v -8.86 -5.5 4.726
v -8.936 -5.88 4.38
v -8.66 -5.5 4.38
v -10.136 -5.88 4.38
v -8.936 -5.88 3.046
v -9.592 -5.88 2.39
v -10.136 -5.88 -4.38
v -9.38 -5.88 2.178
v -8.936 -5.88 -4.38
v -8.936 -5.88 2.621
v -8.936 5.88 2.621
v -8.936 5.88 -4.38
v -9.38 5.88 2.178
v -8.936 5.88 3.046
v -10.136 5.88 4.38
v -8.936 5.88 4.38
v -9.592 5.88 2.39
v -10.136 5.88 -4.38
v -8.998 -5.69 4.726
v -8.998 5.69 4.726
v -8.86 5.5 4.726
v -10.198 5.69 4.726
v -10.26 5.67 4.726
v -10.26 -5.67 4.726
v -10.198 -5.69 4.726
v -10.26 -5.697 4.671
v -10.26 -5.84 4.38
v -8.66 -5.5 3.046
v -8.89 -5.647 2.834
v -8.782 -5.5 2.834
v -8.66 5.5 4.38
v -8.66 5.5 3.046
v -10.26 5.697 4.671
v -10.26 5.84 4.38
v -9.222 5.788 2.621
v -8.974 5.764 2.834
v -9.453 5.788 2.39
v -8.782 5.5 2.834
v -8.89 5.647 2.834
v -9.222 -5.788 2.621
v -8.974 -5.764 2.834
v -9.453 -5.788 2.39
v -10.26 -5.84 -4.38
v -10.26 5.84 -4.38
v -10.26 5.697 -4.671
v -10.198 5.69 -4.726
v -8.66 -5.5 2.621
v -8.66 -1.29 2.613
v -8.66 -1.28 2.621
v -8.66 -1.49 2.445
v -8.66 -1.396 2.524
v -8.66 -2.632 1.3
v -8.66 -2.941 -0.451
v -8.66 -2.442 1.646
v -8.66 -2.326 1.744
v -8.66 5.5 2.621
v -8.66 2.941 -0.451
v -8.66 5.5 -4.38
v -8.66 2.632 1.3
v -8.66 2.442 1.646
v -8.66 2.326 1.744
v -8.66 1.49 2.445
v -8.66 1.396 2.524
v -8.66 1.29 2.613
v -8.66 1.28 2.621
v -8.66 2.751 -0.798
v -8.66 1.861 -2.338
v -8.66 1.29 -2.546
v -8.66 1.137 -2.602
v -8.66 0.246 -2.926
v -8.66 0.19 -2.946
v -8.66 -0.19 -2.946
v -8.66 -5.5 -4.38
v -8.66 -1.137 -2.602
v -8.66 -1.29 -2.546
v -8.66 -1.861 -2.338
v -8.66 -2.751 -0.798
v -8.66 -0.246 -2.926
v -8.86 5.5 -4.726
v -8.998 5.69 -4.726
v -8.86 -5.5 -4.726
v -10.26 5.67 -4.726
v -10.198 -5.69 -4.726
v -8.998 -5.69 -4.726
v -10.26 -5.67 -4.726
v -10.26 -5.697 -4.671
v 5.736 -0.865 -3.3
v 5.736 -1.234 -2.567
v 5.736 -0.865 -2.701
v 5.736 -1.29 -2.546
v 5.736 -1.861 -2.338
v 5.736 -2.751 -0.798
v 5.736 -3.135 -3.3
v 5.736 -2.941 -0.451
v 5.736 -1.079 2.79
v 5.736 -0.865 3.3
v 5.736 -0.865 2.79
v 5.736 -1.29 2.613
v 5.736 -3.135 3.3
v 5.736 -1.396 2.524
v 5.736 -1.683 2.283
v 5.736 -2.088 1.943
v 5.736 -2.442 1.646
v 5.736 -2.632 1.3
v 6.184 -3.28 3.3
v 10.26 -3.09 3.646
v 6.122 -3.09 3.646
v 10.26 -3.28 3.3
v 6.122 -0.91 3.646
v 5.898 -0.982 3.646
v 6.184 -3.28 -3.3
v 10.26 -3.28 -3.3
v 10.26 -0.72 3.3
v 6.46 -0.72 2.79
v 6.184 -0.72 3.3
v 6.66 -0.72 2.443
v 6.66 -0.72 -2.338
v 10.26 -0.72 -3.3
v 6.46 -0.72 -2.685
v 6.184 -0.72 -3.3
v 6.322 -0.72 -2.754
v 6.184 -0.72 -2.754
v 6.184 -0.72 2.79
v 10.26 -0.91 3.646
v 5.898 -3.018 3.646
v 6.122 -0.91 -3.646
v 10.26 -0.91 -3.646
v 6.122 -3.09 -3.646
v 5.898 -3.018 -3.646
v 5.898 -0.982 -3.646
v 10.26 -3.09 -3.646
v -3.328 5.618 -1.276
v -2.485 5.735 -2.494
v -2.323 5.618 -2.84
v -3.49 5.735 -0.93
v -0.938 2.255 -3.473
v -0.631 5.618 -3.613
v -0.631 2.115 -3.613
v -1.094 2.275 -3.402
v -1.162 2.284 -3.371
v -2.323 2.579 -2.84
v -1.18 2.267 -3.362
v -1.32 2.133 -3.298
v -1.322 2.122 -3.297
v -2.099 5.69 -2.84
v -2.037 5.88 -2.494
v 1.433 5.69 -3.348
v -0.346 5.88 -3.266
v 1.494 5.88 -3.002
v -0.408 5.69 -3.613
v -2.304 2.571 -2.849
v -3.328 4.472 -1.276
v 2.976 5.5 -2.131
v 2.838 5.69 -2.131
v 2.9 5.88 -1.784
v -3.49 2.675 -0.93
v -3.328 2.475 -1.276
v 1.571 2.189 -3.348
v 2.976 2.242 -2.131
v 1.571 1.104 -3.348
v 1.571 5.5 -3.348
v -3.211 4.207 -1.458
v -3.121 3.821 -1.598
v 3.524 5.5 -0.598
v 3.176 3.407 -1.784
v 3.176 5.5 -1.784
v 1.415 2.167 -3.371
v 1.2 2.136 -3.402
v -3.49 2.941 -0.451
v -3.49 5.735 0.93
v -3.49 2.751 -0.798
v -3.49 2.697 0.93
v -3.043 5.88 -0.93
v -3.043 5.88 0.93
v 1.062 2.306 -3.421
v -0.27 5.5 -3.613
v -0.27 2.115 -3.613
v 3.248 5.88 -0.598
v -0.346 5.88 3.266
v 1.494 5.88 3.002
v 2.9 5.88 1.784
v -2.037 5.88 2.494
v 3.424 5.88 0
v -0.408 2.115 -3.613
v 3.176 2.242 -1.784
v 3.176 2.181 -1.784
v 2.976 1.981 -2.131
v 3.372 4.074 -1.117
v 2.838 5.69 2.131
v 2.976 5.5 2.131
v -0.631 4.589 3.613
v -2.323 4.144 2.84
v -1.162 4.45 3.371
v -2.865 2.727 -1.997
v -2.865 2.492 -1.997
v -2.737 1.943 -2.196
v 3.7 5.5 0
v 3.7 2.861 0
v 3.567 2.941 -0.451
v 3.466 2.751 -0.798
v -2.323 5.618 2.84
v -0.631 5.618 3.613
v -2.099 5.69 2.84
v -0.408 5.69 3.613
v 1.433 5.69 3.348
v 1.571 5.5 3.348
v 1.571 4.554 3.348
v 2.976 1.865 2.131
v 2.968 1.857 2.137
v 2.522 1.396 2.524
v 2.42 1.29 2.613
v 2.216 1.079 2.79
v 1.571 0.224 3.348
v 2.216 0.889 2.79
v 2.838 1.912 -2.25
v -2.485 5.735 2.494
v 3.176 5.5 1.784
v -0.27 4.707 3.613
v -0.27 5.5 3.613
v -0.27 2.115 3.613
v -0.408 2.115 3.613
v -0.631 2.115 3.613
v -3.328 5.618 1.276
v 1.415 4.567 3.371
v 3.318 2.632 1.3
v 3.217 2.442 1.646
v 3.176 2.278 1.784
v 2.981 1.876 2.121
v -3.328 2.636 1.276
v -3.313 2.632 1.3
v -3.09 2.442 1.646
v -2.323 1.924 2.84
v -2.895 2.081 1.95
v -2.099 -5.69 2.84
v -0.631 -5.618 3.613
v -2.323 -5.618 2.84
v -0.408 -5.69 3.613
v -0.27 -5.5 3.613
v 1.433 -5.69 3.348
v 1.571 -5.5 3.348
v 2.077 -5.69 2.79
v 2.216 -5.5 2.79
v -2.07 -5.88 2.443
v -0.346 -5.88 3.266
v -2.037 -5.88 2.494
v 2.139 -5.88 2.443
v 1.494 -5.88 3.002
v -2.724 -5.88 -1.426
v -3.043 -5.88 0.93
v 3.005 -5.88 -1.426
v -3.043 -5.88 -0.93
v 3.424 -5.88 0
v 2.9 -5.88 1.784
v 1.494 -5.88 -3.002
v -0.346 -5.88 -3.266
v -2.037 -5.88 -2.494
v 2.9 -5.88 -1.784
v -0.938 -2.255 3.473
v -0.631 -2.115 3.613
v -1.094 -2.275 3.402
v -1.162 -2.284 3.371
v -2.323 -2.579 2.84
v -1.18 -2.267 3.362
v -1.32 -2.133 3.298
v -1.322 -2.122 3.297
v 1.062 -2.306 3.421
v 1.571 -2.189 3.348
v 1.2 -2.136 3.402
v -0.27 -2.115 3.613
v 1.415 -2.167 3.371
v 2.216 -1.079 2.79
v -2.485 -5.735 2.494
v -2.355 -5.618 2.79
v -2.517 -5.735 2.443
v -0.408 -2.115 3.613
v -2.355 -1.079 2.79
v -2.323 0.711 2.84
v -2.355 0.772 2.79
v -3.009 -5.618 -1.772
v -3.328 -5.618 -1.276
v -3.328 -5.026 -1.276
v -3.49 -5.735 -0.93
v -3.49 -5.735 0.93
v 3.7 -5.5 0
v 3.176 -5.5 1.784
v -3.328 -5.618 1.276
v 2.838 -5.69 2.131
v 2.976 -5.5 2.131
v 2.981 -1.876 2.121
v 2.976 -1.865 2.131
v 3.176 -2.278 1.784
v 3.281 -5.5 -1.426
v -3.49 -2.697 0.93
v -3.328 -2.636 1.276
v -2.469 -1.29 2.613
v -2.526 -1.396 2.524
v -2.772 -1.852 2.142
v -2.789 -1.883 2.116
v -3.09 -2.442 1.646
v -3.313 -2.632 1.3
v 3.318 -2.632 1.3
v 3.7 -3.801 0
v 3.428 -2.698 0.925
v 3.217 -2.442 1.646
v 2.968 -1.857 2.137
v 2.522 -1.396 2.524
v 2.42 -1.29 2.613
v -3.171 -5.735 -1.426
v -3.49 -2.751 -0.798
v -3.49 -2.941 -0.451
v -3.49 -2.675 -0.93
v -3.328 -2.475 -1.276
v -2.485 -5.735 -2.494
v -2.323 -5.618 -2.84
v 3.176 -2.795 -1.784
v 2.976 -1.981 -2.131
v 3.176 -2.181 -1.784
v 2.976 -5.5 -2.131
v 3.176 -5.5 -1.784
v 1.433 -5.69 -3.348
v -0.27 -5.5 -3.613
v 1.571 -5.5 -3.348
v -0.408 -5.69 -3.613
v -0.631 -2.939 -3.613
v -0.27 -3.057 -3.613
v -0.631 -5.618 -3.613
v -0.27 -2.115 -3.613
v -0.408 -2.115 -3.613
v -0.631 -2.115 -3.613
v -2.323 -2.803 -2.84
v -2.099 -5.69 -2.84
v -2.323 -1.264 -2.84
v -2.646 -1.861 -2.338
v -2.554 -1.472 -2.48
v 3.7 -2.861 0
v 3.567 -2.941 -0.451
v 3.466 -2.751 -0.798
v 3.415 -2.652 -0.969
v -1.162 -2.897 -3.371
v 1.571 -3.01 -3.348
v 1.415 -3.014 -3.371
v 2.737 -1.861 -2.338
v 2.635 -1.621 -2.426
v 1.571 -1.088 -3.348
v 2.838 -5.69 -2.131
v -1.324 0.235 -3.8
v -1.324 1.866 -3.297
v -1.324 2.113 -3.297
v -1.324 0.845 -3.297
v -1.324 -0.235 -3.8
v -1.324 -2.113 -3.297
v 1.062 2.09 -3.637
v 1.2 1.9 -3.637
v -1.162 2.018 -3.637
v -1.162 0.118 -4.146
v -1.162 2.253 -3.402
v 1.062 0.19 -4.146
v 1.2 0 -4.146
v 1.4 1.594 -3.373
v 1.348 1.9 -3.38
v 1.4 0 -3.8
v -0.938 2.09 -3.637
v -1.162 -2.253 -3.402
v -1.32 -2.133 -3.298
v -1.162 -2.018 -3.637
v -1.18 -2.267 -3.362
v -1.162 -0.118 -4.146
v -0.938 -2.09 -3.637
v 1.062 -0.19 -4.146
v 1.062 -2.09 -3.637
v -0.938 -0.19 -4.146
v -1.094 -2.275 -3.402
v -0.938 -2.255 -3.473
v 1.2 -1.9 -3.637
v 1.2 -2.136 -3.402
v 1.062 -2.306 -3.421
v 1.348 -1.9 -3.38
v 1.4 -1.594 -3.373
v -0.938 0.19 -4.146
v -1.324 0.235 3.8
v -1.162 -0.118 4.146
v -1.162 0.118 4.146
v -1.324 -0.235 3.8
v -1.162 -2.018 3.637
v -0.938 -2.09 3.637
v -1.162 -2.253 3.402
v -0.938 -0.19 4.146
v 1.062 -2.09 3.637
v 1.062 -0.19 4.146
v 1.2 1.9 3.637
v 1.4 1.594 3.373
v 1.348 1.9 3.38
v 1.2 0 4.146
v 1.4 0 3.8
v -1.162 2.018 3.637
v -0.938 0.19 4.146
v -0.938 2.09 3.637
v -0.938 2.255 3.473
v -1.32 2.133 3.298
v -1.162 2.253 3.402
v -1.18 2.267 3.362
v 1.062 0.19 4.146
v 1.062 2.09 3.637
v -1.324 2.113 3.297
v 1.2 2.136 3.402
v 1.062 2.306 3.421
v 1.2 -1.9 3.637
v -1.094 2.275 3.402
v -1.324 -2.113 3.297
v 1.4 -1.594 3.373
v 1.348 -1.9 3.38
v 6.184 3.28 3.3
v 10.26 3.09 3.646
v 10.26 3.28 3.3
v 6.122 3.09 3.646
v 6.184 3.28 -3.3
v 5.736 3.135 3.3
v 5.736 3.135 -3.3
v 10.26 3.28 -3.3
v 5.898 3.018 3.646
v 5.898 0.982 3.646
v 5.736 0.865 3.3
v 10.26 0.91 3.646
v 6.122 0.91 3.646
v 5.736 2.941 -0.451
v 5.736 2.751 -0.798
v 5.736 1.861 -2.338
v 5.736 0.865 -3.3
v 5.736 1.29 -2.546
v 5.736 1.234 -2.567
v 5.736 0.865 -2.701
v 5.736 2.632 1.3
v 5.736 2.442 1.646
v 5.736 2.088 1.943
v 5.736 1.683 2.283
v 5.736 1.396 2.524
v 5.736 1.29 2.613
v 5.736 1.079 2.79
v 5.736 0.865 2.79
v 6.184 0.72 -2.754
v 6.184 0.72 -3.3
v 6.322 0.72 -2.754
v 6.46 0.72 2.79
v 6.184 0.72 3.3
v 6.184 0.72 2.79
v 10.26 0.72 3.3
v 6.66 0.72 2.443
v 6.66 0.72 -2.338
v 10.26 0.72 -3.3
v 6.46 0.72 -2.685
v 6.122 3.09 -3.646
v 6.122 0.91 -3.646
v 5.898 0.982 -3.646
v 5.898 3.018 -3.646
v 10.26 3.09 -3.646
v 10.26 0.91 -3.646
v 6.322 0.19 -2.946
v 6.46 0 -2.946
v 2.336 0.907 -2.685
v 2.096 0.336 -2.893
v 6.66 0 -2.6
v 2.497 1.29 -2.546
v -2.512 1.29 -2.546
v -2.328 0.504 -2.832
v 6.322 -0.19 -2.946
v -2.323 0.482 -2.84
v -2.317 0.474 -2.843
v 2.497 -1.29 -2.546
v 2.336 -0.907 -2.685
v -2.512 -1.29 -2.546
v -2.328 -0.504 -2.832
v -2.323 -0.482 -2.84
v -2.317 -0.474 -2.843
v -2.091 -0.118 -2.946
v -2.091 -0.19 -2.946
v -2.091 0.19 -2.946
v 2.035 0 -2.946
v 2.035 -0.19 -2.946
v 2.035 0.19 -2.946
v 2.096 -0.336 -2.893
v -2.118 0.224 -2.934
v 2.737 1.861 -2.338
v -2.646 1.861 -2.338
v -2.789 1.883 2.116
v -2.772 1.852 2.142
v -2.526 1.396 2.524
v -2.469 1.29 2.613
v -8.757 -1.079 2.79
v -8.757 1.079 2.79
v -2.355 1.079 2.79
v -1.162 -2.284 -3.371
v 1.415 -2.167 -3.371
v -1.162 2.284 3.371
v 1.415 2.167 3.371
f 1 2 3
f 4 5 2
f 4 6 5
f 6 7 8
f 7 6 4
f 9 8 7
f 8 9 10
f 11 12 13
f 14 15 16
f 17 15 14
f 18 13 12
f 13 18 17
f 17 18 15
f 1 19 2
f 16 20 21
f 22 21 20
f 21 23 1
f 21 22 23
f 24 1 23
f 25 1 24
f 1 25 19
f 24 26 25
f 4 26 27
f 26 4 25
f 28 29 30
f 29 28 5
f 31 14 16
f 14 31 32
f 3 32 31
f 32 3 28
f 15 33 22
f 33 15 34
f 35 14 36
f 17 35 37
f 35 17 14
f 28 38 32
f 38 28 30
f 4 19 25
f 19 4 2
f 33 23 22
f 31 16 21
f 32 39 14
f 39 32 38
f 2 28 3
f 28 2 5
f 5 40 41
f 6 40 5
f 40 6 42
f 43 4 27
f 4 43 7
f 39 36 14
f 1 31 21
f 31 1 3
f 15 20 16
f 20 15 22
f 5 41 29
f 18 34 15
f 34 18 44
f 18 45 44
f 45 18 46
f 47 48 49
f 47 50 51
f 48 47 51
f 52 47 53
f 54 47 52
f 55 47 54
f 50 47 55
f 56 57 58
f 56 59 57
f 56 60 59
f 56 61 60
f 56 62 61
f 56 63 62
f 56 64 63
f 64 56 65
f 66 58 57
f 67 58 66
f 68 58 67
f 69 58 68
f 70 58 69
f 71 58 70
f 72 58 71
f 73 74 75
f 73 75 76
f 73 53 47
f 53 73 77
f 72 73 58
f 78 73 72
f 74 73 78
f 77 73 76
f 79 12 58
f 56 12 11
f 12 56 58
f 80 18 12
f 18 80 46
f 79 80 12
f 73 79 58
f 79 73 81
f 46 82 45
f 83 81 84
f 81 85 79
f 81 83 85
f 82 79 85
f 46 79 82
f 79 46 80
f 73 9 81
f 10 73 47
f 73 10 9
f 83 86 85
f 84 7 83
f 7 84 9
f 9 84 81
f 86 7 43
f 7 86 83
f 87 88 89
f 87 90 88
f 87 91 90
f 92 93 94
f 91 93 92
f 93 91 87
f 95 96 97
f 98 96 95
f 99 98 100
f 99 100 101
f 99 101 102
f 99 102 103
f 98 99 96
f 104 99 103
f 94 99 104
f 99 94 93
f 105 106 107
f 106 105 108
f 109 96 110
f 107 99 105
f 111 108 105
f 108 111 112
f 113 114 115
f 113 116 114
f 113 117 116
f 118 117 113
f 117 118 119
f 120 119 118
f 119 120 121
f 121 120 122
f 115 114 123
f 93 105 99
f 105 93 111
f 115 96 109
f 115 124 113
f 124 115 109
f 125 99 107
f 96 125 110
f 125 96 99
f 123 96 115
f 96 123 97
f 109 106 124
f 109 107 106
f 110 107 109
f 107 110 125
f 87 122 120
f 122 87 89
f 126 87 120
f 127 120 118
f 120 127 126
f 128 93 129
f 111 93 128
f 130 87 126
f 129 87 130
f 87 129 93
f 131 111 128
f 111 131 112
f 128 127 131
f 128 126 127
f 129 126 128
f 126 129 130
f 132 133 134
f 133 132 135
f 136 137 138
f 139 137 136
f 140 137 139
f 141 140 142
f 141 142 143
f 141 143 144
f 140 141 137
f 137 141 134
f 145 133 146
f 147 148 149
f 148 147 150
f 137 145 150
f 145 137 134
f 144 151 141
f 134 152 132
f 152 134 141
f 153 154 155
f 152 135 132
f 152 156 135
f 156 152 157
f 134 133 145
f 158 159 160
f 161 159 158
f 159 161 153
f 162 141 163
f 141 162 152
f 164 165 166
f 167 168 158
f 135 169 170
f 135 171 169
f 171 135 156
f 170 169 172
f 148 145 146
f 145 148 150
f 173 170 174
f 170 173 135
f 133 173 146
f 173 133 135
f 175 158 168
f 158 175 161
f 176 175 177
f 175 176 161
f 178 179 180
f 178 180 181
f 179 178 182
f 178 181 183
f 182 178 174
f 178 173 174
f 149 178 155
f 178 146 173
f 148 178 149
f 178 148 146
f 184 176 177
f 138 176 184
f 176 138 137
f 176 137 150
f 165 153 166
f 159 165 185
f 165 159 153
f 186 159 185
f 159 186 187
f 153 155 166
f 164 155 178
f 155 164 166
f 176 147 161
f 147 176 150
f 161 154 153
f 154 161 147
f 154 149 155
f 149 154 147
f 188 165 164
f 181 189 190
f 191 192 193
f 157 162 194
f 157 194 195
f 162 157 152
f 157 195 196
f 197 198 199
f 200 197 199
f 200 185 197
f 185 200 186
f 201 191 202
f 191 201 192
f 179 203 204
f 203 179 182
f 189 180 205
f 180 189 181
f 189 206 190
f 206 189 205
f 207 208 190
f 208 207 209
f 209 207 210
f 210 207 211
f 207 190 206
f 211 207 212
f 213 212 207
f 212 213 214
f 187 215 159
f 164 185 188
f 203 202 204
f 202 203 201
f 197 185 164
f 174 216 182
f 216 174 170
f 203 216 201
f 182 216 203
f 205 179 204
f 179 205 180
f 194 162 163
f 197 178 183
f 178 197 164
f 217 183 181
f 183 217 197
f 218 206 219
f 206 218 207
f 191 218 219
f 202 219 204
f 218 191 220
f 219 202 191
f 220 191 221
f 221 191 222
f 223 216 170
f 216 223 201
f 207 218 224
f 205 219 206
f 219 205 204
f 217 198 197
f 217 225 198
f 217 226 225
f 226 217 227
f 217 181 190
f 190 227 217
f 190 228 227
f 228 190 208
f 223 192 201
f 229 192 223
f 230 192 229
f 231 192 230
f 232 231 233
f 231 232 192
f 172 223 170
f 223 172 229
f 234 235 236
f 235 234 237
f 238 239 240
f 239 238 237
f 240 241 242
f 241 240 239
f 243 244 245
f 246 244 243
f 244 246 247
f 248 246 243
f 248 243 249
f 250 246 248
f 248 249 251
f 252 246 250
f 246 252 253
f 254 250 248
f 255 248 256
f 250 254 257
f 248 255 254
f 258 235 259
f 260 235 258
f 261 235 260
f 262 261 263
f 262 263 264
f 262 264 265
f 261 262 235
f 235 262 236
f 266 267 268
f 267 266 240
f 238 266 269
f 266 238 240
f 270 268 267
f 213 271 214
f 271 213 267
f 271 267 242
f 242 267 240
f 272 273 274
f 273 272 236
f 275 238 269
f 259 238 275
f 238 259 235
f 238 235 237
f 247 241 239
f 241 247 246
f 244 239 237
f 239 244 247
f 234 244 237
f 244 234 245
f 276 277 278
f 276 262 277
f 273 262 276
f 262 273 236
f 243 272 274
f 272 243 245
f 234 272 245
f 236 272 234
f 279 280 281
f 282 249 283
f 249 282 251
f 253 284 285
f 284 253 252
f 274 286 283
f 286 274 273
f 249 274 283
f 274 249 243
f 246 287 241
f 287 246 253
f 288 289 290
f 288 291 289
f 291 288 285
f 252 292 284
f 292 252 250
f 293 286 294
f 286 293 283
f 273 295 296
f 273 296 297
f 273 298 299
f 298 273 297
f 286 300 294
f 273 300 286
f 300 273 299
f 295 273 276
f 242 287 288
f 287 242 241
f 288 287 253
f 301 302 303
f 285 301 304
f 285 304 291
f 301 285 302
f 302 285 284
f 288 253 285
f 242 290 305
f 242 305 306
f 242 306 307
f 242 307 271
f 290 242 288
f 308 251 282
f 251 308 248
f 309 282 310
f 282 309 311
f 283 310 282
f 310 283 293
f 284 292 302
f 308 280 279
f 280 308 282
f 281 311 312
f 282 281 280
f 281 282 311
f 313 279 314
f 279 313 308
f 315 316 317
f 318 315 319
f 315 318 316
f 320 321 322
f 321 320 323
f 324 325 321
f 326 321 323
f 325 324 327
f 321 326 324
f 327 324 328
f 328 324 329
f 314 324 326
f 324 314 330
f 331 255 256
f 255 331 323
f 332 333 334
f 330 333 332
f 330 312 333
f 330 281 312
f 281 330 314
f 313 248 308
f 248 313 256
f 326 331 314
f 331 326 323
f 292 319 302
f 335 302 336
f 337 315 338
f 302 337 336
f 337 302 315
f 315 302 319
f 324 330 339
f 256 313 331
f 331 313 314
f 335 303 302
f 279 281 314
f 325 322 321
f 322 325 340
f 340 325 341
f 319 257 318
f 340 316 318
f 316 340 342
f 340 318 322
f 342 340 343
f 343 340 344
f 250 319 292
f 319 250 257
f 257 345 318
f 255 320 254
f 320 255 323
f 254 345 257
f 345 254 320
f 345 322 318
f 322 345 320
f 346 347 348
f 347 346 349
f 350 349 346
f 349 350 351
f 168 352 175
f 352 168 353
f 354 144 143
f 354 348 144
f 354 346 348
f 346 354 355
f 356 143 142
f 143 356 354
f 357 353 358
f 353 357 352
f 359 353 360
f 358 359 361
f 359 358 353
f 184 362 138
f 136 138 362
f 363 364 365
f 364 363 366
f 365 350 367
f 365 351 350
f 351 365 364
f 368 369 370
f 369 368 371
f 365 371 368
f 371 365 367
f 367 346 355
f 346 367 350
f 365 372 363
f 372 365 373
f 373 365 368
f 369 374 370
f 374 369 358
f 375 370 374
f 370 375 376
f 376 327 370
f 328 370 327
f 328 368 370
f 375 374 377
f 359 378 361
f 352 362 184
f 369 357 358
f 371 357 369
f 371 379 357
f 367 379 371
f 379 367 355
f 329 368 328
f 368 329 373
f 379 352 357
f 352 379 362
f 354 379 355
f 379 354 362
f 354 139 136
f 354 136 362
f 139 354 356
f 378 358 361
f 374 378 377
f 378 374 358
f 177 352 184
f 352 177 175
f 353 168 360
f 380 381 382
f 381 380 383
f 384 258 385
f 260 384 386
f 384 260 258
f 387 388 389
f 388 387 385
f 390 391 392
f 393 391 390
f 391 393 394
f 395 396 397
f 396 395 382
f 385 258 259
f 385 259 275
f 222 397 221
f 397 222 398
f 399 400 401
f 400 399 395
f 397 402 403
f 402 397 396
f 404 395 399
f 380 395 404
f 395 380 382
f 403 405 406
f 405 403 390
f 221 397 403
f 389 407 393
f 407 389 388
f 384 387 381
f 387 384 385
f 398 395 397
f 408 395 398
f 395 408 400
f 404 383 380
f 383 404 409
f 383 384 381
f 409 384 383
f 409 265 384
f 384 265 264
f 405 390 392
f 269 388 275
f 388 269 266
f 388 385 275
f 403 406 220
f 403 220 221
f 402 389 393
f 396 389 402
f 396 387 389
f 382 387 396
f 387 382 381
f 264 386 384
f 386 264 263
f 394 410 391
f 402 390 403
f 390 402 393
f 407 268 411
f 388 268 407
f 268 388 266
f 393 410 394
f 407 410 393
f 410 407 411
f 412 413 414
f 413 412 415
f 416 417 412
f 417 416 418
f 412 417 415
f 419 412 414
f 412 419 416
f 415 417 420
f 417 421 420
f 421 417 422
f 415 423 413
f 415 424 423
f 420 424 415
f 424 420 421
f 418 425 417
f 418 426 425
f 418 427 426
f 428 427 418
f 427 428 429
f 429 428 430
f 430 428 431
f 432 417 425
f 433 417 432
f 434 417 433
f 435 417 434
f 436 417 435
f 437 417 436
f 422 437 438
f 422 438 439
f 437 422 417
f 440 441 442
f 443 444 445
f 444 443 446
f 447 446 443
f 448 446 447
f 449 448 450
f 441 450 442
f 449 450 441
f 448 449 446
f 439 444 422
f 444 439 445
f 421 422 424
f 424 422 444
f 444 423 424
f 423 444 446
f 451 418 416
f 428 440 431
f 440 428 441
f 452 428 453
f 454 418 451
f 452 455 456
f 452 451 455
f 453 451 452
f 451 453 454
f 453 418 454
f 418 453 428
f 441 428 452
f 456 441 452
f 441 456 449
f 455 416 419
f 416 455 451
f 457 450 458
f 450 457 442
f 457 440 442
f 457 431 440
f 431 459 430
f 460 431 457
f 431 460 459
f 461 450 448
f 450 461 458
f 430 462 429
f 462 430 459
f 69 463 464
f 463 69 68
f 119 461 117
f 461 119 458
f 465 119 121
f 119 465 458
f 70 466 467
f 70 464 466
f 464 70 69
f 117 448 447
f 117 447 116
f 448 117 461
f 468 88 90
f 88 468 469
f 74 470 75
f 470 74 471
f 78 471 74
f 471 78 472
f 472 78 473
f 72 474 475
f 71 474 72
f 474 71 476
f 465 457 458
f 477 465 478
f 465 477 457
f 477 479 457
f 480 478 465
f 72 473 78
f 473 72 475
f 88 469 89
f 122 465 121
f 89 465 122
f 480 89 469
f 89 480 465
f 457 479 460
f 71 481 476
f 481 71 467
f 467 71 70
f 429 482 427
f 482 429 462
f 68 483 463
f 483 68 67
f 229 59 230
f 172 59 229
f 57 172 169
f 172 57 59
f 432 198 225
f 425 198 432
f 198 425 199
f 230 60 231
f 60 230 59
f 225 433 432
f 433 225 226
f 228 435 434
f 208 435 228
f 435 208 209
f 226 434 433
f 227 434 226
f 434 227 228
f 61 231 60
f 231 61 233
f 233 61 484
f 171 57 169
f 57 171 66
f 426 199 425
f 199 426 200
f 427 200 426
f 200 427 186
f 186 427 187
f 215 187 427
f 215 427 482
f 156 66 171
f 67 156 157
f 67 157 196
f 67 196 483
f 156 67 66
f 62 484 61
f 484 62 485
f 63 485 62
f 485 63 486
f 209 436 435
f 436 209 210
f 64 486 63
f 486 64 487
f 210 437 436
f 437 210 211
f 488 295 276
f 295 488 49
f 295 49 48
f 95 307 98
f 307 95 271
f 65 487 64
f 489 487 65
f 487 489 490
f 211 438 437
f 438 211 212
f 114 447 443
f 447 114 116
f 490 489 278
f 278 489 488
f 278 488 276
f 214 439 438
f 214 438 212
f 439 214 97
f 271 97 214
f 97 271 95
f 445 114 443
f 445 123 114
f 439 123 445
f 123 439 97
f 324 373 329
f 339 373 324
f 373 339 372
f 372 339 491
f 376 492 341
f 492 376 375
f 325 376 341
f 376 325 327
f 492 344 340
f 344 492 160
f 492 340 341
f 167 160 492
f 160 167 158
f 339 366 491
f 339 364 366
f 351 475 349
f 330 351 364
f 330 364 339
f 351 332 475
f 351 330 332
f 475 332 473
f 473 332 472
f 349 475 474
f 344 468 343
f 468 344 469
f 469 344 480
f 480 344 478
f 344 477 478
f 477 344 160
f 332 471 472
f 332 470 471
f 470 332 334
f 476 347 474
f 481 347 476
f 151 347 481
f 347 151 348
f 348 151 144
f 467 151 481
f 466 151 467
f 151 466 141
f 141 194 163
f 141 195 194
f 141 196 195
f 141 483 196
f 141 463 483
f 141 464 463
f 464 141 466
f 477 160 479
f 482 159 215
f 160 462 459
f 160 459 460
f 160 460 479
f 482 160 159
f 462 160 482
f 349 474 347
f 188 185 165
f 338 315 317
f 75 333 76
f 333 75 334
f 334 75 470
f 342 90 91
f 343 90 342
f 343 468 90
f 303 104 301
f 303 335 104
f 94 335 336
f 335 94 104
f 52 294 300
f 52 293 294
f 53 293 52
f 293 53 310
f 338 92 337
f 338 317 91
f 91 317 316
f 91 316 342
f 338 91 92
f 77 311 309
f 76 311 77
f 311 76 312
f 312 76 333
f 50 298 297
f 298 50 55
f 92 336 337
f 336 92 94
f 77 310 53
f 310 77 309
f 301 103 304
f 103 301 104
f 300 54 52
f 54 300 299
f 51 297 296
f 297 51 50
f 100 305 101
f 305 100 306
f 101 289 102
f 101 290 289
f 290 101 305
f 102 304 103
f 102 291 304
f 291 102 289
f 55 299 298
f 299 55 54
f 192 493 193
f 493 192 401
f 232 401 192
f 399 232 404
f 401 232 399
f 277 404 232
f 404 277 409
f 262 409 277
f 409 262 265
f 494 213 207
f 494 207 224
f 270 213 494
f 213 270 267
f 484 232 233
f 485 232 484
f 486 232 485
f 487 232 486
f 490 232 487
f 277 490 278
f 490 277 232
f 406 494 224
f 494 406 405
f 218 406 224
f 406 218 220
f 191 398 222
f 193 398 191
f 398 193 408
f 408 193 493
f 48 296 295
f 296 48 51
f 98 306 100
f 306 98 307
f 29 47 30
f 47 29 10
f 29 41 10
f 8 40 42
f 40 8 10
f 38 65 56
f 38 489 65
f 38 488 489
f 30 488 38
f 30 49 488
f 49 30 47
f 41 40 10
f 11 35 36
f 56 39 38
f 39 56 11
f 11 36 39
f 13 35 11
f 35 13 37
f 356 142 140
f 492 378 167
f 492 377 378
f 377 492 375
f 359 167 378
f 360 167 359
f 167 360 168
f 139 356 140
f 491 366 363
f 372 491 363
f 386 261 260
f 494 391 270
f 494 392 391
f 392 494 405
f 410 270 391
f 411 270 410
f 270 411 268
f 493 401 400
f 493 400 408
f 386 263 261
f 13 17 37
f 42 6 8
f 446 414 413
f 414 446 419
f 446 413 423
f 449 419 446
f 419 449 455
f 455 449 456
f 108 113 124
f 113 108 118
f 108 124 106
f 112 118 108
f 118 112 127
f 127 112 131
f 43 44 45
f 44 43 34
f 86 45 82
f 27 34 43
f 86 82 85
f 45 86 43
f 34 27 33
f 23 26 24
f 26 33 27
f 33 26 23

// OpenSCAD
// Parameters
bbox_X = 18.92; //[9.46:37.84:0.01]
bbox_Y = 11.0; //[5.5:22.0:0.01]
bbox_Z = 8.76; //[4.38:17.52:0.01]
barrel_len = 11.0; //[5.5:22.0:0.01]
barrel_d = 6.6; //[3.3:13.2:0.01]
stem_len = 18.92; //[9.46:37.84:0.01]
stem_d = 5.2; //[2.6:10.4:0.01]
collar_d = 7.6; //[3.8:15.2:0.01]
collar_thk = 2.0; //[1.0:4.0:0.01]
flange_thk = 1.2; //[0.6:2.4:0.01]
flange_w = 11.0; //[5.5:22.0:0.01]
flange_h = 8.76; //[4.38:17.52:0.01]
prong_len = 4.2; //[2.1:8.4:0.01]
prong_thk = 1.8; //[0.9:3.6:0.01]
slot_w = 2.2; //[1.1:4.4:0.01]
slot_depth = 4.0; //[2.0:8.0:0.01]
tip_chamfer = 0.6; //[0.3:1.2:0.01]
overlap = 0.8; //[0.3:2.0:0.01]
micro_chamfer = 0.3; //[0.1:0.8:0.01]
fillet_r = 0.4; //[0.2:1.0:0.01]

// Base Shapes
module stem_cylinder() {
  rotate([0, 90, 0])
    translate([0, 0, 0])
      cylinder(r=stem_d/2, h=stem_len, center=true);
}

module barrel_cylinder() {
  rotate([90, 0, 0])
    translate([0, 0, 0])
      cylinder(r=barrel_d/2, h=barrel_len, center=true);
}

module junction_collar_shoulder() {
  rotate([0, 90, 0])
    translate([0, 0, 0])
      cylinder(r=collar_d/2, h=collar_thk, center=true);
}

module flange_stop_plate() {
  translate([-(stem_len/2) + (flange_thk/2) - overlap, 0, 0])
    cube([flange_thk, flange_w, flange_h], center=true);
}

module fork_prong_top() {
  translate([(stem_len/2) - (prong_len/2) + overlap, (slot_w/2) + (prong_thk/2), 0])
    cube([prong_len, prong_thk, barrel_d], center=true);
}

module fork_prong_bottom() {
  translate([(stem_len/2) - (prong_len/2) + overlap, -((slot_w/2) + (prong_thk/2)), 0])
    cube([prong_len, prong_thk, barrel_d], center=true);
}

module fork_u_slot_cut() {
  translate([(stem_len/2) - (slot_depth/2) + overlap, 0, 0])
    cube([slot_depth, slot_w, barrel_d + 2*overlap], center=true);
}

module prong_tip_chamfer_top() {
  rotate([0, 0, 45])
    translate([(stem_len/2) - (tip_chamfer/2), (slot_w/2) + (prong_thk/2), 0])
      cube([tip_chamfer, prong_thk + 2*overlap, barrel_d + 2*overlap], center=true);
}

module prong_tip_chamfer_bottom() {
  rotate([0, 0, -45])
    translate([(stem_len/2) - (tip_chamfer/2), -((slot_w/2) + (prong_thk/2)), 0])
      cube([tip_chamfer, prong_thk + 2*overlap, barrel_d + 2*overlap], center=true);
}

module barrel_end_faces_trim() {
  translate([0, 0, 0])
    cube([stem_len + 2*overlap, barrel_len + 2*overlap, bbox_Z + 2*overlap], center=true);
}

module stem_end_face_trim() {
  translate([0, 0, 0])
    cube([stem_len + 2*overlap, bbox_Y + 2*overlap, bbox_Z + 2*overlap], center=true);
}

module micro_chamfers_on_flange() {
  rotate([0, 45, 0])
    translate([-(stem_len/2) + flange_thk - (micro_chamfer/2), 0, 0])
      cube([micro_chamfer, flange_w + 2*overlap, flange_h + 2*overlap], center=true);
}

module fillet_kernel_sphere() {
  translate([0, 0, 0])
    sphere(r=fillet_r, center=true);
}

// Operations
module t_core_union() {
  union() {
    stem_cylinder();
    barrel_cylinder();
    junction_collar_shoulder();
    flange_stop_plate();
    fork_prong_top();
    fork_prong_bottom();
  }
}

module fork_prongs_u_slot() {
  difference() {
    t_core_union();
    fork_u_slot_cut();
  }
}

module prong_tip_chamfers() {
  difference() {
    fork_prongs_u_slot();
    prong_tip_chamfer_top();
    prong_tip_chamfer_bottom();
  }
}

module micro_chamfered_flange() {
  difference() {
    prong_tip_chamfers();
    micro_chamfers_on_flange();
  }
}

module small_edge_fillets() {
  minkowski() {
    micro_chamfered_flange();
    fillet_kernel_sphere();
  }
}

module bounded_model() {
  intersection() {
    small_edge_fillets();
    barrel_end_faces_trim();
    stem_end_face_trim();
  }
}

// Final Output
bounded_model();
